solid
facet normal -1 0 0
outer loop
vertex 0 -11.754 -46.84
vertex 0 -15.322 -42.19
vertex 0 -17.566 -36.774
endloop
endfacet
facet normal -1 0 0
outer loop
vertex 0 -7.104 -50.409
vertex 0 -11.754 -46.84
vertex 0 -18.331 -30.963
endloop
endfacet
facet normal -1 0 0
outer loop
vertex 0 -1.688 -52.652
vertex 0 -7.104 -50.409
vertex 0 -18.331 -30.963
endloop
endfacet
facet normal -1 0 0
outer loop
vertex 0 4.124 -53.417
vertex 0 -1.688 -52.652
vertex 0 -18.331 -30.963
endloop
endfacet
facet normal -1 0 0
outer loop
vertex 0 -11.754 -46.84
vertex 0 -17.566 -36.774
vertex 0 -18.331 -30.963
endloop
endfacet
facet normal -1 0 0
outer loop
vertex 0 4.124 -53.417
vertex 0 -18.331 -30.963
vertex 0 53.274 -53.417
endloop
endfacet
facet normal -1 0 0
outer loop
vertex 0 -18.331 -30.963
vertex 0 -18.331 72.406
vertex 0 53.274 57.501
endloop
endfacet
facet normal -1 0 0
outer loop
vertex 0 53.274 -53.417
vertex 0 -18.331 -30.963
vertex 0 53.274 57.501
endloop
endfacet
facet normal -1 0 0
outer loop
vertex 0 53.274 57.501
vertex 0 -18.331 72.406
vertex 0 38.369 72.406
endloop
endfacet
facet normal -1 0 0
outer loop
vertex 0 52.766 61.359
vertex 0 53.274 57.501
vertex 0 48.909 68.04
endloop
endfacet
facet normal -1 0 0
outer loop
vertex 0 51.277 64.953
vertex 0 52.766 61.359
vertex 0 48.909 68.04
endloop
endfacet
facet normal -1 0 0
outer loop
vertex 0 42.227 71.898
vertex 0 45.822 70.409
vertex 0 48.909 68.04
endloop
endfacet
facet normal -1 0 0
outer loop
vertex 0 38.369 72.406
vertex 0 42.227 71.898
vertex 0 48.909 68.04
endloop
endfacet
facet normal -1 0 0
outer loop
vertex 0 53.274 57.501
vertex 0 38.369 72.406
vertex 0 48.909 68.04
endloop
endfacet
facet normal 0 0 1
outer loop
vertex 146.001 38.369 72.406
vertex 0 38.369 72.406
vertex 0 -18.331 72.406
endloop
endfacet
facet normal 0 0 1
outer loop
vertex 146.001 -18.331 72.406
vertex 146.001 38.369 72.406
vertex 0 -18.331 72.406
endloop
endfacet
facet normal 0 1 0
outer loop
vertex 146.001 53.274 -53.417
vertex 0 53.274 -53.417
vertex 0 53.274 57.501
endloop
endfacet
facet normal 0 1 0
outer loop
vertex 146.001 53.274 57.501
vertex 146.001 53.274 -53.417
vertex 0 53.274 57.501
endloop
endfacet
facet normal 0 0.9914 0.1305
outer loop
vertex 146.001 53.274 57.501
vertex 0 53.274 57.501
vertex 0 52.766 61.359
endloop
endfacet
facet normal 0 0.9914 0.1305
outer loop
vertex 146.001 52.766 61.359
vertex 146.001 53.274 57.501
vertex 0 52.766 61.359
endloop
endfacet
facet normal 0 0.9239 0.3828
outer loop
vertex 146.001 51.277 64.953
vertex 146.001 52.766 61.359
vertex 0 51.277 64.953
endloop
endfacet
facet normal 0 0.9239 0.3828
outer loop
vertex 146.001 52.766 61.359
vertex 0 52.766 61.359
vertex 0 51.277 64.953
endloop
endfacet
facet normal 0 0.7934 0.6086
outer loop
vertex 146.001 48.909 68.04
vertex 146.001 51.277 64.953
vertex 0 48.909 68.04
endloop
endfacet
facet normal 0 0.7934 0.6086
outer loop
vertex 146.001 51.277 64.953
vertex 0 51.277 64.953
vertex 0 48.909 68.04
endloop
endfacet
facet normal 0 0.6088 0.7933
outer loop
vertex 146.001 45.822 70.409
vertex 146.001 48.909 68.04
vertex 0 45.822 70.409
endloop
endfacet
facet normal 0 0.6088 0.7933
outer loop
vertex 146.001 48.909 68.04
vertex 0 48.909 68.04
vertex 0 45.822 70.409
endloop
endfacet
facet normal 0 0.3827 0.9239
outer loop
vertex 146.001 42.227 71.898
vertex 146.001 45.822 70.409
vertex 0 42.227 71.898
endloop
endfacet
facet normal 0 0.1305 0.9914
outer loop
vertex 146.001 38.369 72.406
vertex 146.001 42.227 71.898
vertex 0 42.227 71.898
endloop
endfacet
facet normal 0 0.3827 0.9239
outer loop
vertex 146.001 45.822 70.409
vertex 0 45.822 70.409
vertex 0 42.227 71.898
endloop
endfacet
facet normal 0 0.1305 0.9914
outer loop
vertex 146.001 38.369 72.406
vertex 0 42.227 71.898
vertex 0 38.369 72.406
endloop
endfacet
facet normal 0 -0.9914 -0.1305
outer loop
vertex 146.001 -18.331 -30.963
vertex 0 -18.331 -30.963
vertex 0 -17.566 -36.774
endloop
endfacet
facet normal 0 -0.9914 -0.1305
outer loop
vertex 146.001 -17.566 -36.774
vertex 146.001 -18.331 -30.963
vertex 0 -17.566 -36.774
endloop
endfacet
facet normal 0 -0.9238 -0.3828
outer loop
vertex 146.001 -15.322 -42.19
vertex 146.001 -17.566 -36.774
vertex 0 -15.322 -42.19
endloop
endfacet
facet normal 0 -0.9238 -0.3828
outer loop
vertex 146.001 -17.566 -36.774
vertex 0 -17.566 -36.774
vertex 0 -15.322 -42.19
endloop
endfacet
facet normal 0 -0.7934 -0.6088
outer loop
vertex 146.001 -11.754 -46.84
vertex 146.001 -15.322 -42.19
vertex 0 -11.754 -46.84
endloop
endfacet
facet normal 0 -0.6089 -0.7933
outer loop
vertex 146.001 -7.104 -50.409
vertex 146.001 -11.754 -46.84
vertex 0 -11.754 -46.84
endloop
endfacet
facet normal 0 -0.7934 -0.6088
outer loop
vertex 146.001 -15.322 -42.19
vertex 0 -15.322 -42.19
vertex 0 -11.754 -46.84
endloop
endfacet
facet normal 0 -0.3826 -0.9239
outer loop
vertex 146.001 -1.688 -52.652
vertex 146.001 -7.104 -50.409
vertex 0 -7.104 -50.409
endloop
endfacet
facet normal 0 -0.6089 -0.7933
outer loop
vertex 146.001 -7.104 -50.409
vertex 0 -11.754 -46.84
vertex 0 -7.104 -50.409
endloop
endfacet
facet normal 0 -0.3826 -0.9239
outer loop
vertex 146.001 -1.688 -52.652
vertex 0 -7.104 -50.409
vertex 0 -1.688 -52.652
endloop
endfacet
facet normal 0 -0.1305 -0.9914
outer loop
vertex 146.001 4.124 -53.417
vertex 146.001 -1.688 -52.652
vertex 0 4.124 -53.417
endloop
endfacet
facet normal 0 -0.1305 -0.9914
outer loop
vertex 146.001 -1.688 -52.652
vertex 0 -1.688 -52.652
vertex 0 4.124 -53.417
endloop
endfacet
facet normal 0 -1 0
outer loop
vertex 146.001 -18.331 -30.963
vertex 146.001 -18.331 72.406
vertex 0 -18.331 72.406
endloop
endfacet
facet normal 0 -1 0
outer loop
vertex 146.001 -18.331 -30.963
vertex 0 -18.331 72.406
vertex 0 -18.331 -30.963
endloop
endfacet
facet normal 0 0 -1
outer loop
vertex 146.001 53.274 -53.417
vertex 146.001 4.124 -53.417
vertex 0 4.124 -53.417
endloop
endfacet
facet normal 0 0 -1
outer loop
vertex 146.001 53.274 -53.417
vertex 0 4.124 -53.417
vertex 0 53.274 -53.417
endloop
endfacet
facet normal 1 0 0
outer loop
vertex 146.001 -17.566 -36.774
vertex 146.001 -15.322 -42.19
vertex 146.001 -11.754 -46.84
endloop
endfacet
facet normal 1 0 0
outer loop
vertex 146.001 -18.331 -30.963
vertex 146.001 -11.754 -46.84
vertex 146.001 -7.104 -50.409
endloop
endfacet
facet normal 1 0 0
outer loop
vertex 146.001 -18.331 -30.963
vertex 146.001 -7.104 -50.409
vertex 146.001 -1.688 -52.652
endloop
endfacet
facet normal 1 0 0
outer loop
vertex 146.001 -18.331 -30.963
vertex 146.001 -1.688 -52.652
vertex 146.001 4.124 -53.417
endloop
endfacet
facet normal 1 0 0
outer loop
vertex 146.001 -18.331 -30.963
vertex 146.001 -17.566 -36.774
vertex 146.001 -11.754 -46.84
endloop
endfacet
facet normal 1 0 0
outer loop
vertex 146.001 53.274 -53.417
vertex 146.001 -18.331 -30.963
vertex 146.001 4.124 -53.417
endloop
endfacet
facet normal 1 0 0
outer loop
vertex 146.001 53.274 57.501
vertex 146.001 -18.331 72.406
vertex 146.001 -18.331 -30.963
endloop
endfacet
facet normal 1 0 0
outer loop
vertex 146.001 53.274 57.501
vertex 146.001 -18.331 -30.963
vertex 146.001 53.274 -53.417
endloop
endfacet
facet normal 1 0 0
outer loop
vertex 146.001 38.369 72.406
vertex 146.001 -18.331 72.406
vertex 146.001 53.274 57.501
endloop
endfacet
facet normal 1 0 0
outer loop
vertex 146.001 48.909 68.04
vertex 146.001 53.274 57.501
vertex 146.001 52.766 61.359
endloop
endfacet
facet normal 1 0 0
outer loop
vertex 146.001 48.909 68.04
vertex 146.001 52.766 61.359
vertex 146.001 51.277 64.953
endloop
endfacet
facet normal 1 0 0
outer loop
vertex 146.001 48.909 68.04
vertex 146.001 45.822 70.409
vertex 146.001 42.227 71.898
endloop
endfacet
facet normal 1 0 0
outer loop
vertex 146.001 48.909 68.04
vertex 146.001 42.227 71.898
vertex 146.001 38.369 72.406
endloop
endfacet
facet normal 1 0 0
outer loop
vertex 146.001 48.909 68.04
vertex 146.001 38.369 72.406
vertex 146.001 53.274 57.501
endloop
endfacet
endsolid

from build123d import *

# Parameters (mm, degrees)
F1_DEPTH = 146.001203


with BuildPart() as f1:
    # F0 (on Right) → F1 (new body)
    with BuildSketch(Plane.YZ):
        with BuildLine():
            Line((38.369116, 72.40589), (-18.330798, 72.40589))
            Line((-18.330798, 72.40589), (-18.330798, -30.96252))
            ThreePointArc((-18.330798, -30.96252), (-11.754066, -46.840154), (4.123567, -53.416885))
            Line((4.123567, -53.416885), (53.274147, -53.416885))
            Line((53.274147, -53.416885), (53.274147, 57.500858))
            ThreePointArc((53.274147, 57.500858), (48.908565, 68.040307), (38.369116, 72.40589))
        make_face()
    extrude(amount=F1_DEPTH)


solid = f1.part
